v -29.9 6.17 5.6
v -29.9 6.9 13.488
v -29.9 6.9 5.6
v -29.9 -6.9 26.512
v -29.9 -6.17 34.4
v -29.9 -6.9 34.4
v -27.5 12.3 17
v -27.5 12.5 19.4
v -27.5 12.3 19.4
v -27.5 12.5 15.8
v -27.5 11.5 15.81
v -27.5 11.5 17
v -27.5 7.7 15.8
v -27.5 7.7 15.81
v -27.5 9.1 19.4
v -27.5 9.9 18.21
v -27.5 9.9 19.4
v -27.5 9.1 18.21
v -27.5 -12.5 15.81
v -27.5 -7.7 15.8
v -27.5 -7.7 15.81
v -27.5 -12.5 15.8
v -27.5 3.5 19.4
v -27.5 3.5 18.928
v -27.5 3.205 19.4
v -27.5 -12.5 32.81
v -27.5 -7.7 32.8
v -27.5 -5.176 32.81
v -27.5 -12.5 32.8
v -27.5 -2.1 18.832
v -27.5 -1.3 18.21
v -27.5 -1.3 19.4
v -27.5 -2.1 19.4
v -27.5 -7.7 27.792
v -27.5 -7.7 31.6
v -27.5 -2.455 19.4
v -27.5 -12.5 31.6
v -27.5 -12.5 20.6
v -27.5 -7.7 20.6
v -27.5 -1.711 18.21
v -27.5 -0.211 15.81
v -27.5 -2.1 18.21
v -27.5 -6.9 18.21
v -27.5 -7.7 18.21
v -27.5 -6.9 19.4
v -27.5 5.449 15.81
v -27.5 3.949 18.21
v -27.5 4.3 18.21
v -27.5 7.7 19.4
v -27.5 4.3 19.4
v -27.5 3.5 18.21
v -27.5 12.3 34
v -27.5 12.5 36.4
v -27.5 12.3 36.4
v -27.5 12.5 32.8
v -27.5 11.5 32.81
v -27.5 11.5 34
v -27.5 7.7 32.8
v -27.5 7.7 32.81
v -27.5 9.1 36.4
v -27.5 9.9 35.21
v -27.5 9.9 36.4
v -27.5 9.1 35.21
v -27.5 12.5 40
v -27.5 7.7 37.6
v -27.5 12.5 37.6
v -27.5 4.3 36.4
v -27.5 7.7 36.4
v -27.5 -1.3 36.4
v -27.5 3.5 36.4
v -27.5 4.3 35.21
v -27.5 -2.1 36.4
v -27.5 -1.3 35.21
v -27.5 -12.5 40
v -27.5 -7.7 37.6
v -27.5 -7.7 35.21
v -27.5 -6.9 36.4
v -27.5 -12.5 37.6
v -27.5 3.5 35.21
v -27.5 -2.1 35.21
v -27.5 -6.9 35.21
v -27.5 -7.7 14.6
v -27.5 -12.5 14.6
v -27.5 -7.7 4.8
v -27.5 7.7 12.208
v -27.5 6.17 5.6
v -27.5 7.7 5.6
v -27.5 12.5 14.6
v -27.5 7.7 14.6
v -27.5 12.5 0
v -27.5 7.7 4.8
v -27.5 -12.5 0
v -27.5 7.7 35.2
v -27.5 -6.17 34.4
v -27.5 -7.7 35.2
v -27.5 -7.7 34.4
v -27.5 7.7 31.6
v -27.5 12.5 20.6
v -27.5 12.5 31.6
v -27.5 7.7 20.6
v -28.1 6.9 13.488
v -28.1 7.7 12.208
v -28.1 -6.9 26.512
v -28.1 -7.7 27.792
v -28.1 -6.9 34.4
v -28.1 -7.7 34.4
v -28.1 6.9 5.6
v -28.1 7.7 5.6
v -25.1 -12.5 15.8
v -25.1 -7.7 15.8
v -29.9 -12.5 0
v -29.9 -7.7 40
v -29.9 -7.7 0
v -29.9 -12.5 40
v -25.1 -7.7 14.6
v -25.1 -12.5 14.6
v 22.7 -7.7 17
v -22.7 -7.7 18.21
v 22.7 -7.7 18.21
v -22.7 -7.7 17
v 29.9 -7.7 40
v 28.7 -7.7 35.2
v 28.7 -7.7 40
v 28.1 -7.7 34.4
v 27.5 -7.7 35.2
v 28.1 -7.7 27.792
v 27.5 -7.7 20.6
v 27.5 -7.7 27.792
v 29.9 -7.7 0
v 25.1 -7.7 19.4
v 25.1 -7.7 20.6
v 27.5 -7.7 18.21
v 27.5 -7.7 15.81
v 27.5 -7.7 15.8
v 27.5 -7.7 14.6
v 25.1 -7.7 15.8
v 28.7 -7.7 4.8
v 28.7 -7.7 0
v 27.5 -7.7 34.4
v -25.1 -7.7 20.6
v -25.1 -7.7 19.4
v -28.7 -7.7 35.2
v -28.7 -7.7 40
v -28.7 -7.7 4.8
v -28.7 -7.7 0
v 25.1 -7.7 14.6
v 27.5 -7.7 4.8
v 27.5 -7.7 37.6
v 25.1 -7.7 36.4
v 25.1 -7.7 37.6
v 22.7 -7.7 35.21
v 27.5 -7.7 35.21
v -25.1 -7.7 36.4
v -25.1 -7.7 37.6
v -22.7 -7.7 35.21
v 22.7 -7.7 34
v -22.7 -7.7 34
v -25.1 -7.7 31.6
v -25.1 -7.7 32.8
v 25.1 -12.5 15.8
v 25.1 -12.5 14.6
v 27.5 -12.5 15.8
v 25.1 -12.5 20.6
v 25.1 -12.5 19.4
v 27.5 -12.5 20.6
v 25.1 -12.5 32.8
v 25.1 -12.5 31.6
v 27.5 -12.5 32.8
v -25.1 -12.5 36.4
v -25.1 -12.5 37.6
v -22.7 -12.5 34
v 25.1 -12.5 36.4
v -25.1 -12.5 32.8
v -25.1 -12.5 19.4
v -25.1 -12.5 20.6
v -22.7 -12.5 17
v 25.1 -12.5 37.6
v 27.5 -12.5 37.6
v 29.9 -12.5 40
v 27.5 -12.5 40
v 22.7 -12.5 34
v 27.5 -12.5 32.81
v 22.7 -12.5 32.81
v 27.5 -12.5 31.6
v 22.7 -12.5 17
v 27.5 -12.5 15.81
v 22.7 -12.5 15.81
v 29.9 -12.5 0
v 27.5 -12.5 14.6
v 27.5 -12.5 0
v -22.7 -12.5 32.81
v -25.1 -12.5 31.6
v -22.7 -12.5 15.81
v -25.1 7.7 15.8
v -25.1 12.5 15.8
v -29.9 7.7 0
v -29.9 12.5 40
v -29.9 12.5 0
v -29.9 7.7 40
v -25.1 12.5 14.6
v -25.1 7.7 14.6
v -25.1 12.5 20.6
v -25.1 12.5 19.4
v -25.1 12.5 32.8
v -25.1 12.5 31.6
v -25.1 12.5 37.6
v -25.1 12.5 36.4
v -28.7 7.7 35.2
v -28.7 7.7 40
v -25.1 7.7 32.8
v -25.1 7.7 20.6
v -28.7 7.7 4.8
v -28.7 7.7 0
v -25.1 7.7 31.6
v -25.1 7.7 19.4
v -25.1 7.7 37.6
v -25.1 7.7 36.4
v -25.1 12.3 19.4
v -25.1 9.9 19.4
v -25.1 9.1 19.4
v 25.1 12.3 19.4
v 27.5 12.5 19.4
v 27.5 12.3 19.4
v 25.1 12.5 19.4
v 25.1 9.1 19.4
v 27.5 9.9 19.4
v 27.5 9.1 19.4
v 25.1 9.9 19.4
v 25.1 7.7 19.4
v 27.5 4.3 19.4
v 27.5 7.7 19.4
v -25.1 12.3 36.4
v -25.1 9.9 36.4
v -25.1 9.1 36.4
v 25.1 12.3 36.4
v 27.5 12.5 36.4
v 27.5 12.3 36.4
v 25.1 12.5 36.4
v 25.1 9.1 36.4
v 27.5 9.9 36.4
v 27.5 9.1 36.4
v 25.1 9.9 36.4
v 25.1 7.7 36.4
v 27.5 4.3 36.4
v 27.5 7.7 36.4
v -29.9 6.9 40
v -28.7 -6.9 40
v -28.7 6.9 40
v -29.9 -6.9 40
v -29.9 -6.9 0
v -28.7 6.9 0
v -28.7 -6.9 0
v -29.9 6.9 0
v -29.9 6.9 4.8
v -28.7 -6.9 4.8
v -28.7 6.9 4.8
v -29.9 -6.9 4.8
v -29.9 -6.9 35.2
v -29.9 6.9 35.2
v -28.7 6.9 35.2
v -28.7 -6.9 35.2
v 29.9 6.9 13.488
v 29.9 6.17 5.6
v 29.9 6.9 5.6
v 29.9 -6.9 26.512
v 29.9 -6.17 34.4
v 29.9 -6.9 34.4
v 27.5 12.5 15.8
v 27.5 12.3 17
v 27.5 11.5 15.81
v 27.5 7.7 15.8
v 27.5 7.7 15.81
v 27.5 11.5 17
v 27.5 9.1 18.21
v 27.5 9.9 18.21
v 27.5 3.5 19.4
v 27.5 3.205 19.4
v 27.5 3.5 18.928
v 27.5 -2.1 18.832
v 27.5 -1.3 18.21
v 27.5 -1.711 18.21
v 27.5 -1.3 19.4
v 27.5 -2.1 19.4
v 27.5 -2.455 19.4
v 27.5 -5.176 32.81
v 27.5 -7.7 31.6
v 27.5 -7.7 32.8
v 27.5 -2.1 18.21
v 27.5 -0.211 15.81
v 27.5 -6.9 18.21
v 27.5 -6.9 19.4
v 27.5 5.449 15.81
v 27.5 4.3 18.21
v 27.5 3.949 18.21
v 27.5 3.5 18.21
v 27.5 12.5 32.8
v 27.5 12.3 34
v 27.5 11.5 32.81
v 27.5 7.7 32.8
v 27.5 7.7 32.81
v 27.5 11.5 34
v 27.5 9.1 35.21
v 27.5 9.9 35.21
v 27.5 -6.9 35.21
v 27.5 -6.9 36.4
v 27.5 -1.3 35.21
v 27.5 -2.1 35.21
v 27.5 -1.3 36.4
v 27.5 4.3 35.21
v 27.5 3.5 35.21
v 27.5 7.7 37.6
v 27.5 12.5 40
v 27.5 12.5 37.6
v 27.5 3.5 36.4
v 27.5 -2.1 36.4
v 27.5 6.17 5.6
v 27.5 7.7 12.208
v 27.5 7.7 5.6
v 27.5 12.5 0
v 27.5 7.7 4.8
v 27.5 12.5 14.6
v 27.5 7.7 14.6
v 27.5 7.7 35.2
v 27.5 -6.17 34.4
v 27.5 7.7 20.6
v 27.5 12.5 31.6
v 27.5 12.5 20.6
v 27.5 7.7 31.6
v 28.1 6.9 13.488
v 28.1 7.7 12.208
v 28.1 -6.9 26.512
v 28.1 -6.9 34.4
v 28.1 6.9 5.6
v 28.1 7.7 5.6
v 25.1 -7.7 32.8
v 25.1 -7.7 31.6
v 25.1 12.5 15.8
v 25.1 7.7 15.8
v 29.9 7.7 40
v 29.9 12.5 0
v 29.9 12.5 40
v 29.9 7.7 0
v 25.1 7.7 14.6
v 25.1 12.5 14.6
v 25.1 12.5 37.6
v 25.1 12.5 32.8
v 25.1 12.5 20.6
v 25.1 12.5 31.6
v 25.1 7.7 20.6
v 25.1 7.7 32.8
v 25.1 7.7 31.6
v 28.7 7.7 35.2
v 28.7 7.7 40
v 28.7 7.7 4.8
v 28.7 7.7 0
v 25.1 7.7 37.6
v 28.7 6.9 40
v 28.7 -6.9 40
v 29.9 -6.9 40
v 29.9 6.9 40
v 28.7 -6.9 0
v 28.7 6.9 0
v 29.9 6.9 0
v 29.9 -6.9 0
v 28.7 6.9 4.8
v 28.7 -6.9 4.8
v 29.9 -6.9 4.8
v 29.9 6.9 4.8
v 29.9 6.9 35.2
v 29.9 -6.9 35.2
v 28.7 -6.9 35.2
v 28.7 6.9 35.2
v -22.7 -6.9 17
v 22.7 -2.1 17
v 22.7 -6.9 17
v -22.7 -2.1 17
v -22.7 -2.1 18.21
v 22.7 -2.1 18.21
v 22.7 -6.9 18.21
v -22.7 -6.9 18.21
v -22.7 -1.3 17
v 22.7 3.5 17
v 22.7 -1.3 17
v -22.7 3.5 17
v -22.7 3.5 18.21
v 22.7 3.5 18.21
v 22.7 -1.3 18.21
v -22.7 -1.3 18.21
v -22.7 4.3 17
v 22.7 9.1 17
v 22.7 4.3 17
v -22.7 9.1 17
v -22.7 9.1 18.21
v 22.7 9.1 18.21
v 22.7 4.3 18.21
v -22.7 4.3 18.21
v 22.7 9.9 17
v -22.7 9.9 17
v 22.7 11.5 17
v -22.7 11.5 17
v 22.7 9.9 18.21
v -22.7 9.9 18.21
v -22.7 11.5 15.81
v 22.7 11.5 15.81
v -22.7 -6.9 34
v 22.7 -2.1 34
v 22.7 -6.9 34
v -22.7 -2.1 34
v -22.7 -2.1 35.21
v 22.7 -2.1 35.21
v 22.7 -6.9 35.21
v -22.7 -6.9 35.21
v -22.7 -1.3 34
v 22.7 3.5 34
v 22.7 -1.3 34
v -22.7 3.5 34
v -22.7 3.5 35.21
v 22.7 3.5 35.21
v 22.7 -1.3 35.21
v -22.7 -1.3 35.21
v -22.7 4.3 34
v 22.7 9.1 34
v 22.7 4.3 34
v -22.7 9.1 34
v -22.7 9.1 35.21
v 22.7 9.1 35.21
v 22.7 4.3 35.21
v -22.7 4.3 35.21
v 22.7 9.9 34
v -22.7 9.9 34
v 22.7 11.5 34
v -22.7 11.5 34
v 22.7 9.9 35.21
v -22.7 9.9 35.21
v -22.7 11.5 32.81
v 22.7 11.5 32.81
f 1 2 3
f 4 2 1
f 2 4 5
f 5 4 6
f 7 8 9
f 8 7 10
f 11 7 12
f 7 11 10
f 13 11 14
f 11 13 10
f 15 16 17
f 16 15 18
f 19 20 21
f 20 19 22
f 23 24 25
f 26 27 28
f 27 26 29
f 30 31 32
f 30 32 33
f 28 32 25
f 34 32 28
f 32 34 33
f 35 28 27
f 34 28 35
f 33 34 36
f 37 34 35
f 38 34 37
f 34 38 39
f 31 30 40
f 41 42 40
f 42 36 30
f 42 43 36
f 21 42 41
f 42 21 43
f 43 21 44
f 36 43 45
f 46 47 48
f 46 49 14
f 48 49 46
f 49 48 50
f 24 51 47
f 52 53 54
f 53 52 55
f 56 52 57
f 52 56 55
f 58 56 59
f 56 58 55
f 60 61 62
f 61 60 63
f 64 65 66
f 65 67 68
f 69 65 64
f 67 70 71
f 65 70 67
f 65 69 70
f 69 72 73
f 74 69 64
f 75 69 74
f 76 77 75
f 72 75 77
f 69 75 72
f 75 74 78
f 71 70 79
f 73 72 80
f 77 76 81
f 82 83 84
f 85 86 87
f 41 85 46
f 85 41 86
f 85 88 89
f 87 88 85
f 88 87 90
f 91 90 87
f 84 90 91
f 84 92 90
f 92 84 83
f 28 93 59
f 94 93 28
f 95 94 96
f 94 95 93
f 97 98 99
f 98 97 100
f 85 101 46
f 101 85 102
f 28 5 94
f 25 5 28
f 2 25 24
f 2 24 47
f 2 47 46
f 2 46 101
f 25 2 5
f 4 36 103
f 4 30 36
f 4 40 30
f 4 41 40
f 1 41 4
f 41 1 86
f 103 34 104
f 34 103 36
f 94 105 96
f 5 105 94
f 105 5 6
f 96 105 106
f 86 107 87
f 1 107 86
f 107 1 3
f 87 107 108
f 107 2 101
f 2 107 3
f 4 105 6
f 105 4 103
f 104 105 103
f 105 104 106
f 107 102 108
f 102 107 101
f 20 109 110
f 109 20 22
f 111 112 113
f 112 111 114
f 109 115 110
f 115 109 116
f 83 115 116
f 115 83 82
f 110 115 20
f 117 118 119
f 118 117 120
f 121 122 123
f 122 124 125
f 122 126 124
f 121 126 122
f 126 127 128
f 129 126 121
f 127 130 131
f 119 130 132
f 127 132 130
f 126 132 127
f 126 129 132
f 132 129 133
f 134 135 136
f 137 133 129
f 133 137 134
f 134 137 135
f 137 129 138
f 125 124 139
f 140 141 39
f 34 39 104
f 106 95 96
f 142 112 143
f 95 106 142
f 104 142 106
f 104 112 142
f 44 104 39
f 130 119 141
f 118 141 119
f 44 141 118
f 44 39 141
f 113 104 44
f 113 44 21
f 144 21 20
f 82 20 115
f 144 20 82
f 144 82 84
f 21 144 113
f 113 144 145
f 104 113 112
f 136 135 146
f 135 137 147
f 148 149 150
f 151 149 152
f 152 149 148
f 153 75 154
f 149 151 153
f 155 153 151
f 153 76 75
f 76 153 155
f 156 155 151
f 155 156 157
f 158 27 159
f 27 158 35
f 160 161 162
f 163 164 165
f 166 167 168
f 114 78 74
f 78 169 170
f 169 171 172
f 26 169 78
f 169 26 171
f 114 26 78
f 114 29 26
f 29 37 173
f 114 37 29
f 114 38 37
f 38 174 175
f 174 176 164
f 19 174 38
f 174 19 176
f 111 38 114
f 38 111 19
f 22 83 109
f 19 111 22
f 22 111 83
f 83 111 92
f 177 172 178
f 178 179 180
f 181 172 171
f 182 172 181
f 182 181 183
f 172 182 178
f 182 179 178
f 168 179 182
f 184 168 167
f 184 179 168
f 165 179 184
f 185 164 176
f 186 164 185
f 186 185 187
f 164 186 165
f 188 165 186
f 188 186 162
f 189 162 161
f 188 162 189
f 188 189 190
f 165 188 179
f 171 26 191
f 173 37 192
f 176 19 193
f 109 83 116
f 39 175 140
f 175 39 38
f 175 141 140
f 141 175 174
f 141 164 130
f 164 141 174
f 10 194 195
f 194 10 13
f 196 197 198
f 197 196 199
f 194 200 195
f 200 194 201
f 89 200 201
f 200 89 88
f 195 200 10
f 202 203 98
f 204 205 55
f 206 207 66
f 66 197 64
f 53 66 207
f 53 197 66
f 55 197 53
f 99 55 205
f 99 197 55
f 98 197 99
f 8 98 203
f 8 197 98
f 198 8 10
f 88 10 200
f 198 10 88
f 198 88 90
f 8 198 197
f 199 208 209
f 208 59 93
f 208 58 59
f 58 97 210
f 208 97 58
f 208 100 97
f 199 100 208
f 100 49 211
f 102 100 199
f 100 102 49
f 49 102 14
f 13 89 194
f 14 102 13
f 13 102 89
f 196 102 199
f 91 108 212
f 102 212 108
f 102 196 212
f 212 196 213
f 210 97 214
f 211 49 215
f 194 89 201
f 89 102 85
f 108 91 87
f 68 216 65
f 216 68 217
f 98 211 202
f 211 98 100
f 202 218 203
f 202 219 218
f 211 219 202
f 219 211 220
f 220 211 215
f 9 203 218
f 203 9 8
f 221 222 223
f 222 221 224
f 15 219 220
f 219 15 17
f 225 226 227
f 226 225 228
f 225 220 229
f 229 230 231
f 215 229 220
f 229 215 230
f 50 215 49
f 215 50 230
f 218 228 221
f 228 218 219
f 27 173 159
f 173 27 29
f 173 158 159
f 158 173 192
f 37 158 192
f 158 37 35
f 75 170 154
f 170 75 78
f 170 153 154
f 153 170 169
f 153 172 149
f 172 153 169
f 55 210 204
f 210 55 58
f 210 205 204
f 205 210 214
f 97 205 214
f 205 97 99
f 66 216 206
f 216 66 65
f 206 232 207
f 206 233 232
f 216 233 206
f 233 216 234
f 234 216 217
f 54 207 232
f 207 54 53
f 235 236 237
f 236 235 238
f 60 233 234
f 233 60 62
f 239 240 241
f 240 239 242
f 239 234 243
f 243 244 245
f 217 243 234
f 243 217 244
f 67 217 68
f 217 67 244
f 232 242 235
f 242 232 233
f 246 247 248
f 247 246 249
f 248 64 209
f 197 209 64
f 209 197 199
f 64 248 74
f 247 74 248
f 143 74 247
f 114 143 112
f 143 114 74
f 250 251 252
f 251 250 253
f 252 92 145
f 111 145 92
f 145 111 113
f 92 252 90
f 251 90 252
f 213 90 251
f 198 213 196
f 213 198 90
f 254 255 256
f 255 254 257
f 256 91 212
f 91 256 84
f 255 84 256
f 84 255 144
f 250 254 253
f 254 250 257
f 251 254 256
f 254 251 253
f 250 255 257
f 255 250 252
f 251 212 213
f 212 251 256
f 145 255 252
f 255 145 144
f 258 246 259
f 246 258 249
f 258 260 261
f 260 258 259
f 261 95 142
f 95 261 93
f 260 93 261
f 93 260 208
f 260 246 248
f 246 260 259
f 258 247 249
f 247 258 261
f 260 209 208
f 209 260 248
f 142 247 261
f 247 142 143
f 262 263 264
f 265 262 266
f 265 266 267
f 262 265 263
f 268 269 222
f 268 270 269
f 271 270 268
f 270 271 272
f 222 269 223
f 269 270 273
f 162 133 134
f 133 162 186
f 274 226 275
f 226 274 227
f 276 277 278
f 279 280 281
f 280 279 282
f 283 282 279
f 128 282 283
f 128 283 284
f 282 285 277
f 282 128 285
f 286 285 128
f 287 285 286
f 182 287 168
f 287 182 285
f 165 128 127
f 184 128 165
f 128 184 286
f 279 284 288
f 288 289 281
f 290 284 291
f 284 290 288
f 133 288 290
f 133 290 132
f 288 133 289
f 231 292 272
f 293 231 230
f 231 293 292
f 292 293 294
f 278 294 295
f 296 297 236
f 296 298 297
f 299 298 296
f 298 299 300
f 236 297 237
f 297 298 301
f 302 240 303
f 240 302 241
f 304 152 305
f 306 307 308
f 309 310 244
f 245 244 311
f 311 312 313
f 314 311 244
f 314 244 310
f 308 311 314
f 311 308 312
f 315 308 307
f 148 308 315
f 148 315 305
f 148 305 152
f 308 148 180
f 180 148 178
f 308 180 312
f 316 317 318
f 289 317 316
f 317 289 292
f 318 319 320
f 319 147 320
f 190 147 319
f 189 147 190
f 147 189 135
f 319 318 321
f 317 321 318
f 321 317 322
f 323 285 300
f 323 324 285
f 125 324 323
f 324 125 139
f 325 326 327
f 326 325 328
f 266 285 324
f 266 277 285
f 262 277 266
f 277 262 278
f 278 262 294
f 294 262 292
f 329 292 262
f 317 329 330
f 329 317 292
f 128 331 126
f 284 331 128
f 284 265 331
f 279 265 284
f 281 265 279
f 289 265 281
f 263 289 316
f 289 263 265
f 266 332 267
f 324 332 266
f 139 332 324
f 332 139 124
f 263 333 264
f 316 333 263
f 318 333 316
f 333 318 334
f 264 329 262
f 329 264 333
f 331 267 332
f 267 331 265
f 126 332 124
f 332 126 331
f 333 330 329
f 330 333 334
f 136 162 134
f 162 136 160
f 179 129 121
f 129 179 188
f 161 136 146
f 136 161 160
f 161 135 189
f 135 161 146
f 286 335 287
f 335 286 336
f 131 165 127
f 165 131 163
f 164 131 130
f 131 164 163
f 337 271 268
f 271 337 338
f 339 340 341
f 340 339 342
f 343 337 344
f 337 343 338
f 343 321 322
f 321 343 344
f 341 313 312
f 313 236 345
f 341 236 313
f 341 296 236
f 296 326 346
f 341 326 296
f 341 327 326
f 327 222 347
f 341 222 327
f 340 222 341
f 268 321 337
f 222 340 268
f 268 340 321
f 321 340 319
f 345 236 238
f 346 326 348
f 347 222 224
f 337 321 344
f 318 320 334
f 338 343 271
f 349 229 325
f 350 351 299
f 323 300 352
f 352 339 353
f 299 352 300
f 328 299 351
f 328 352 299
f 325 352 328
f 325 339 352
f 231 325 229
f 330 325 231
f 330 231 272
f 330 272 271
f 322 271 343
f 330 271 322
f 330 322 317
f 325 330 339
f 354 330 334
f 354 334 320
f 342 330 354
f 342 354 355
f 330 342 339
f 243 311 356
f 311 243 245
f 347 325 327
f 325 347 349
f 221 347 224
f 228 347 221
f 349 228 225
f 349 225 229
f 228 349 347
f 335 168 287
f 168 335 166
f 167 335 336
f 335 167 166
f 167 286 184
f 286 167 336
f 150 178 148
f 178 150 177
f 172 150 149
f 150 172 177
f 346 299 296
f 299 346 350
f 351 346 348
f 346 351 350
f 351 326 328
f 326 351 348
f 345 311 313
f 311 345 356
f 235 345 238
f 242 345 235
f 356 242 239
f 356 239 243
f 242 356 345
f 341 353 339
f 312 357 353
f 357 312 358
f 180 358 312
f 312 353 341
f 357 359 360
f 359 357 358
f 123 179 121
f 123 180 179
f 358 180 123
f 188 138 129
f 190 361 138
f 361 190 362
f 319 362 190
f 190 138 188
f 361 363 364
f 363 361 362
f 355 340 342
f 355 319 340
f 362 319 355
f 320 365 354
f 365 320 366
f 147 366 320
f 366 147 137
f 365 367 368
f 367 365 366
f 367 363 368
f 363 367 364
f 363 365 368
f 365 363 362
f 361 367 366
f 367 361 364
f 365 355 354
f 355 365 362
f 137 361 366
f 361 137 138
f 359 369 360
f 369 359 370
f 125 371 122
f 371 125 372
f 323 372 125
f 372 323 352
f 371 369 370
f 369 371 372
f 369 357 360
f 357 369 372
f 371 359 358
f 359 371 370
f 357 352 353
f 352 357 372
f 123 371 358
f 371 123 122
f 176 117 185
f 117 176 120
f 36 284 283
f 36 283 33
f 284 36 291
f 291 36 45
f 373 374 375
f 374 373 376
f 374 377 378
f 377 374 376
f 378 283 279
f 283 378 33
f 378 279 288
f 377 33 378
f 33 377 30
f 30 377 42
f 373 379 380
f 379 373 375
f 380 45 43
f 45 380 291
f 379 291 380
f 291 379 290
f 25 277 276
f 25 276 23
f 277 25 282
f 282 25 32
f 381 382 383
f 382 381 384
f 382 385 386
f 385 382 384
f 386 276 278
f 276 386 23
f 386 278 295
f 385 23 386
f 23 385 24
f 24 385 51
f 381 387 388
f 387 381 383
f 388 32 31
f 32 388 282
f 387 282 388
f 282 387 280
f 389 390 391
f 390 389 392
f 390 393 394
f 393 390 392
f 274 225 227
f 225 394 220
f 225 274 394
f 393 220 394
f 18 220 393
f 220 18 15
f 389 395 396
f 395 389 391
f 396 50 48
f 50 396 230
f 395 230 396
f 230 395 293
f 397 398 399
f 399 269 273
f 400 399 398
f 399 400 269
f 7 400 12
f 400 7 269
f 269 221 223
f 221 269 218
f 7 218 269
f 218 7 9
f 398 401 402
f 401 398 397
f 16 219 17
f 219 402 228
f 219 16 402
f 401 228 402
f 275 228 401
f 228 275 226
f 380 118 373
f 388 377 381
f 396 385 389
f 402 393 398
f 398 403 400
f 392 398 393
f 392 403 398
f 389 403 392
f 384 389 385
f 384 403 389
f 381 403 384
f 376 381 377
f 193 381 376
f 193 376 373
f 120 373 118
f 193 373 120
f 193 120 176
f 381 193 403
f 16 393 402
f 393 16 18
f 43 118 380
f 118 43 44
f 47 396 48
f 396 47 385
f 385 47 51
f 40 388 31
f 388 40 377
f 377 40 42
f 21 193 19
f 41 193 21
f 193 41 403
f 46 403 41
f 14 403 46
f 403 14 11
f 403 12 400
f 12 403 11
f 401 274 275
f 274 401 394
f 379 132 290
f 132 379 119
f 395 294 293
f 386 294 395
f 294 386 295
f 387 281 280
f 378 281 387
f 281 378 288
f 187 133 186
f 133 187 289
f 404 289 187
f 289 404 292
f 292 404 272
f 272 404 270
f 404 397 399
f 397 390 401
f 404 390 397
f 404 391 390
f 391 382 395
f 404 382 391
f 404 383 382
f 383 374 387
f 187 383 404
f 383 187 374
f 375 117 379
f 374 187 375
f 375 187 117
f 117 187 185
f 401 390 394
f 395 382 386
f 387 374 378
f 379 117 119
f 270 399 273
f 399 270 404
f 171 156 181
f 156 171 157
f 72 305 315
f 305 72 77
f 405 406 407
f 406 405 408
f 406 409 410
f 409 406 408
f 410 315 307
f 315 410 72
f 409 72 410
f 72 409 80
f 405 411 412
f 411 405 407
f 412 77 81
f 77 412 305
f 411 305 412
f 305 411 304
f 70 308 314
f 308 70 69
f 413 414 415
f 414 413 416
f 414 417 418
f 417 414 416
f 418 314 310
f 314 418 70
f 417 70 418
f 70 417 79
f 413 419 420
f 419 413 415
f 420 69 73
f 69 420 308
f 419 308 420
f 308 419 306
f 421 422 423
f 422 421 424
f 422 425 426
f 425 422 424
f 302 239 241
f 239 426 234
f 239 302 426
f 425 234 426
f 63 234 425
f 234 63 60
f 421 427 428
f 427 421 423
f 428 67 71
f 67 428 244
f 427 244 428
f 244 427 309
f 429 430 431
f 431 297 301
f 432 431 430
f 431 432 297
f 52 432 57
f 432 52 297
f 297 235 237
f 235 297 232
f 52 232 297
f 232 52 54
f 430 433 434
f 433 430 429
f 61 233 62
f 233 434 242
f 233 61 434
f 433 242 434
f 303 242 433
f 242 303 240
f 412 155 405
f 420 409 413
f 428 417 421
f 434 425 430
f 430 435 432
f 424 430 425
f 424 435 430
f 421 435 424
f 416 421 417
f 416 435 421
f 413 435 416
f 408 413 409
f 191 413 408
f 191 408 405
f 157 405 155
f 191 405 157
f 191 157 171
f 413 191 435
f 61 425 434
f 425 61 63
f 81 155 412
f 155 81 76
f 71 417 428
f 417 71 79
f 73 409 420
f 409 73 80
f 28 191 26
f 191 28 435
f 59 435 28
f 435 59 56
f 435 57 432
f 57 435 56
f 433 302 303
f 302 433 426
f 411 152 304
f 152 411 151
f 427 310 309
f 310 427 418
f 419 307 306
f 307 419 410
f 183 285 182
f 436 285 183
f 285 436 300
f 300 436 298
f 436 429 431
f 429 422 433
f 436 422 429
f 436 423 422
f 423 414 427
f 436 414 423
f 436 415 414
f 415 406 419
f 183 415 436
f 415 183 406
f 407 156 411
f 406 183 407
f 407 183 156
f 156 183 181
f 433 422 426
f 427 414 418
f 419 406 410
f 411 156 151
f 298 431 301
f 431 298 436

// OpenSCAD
/* [Parameters] */
parts = 1; // [1:preview, 2:plated, 3: sides_only, 4: shelf_only]

width = 55;
height = 40;
depth = 25;
numShelves = 2;

/* [Hidden] */
boardWidth = 4.8;
boardThick = 1.2;

boardGap = 0.8;

nozzleWidth = 0.4;

clearance = 0;

function getShelfSpacing(h, num) = floor((h - boardWidth)/num);
 

module side(w, h, num)
{
    w2 = w - ((boardGap+boardWidth)*2);
    h2 = h - ((boardGap+boardWidth)*2);
    
    shelfSpacing = getShelfSpacing(h, num);
    
    union() {
        // vertical sides 
        cube([h, boardWidth, boardThick*2]);
        
        translate([0, w-boardWidth, 0])
        cube([h, boardWidth, boardThick*2]);

        // horizaontal sides
        translate([0, boardWidth+boardGap, 0])
        cube([boardWidth, w2, boardThick*2]);
        cube([boardWidth, w, boardThick]);

        translate([h-boardWidth, boardWidth+boardGap, 0])
        cube([boardWidth, w2, boardThick*2]);
        translate([h-boardWidth, 0, 0])
        cube([boardWidth, w, boardThick]);
        
        theta = -atan(w/h);
        
        intersection() {
            translate([h/2, w/2, boardThick])
            rotate([0,0,theta])
            cube([h*2, boardWidth, boardThick*2], center=true);
            
            translate([h/2, w/2, 0])
            cube([h2, w2, boardThick * 5], center=true); 
        }
        
        intersection() {
            translate([h/2, w/2, boardThick])
            rotate([0,0,theta])
            cube([h*2, boardWidth, boardThick*2], center=true);
            
            translate([h/2, w/2, 0])
            cube([h2, w, boardThick], center=true); 
        }
        

        for (i=[1:num]) {
            translate([(i*shelfSpacing)-boardThick*2-clearance,0,-boardThick*2])
            cube([boardThick,boardWidth,boardWidth]);
            
            translate([(i*shelfSpacing)+boardThick*2+clearance,0,-boardThick*2])
            cube([boardThick,boardWidth,boardWidth]);

            translate([(i*shelfSpacing)-boardThick*2-clearance,w-boardWidth,-boardThick*2])
            cube([boardThick,boardWidth,boardWidth]);
            translate([(i*shelfSpacing)+boardThick*2-clearance,w-boardWidth,-boardThick*2])
            cube([boardThick,boardWidth,boardWidth]);
        }
        
    }
}

module single_shelf(w, d) {
    numFullBoards = floor(d/(boardWidth+boardGap));
    
    leftOver = d - (boardWidth*numFullBoards) - (boardGap*(numFullBoards));
    
    finalBoardWidth = floor(leftOver/nozzleWidth) * nozzleWidth;

    totalRealDepth = numFullBoards * (boardWidth + boardGap) + finalBoardWidth - boardGap;
        
    union() {
        for (i=[0:numFullBoards-1]) {
            translate([0, i*(boardWidth+boardGap), 0])
            cube([w, boardWidth, boardThick*2]);
        }
        
        translate([0, numFullBoards*(boardWidth+boardGap), 0])
        cube([w, finalBoardWidth, boardThick*2]);
        
        
        // supports
        translate([0,0,-boardThick+0.01])
        cube([boardWidth, totalRealDepth, boardThick*2]);

        translate([w-boardWidth,0,-boardThick+0.01])
        cube([boardWidth, totalRealDepth, boardThick*2]);
    }
}

module shelves(w, h, d, num)
{
    translate([0,0,0])
    rotate([0,-90,0])
    
    side(d, h, num);
    
    translate([w,0,0])
    rotate([0,-90,0])
    scale([1,1,-1])
    side(d,h, num);
    
    shelfSpacing = getShelfSpacing(h, num);
    
    for (i=[1:num])
    {
        translate([0,0,i*shelfSpacing])
        single_shelf(w,d);
    }
}

module shelf_plated(w, h, d, num)
{
    translate([w*1.2,0,0])
    sides_plated(w,h,d,num);
    
    off = ((num * d) + (num-1)*(d*0.2))/2;
    
    for (i=[0:num-1]) 
    {
        translate([0,i*1.2*d-off+d,0])
        single_shelf_plated(w,h,d);
    }
}

module sides_plated(w, h, d, num)
{
    translate([0,0,boardThick*2])
    rotate([180,0,0])
    side(d,h,num);
    
    translate([0,d*0.2,boardThick*2])
    rotate([180,0,0])
    scale([1,-1,1])
    side(d,h,num);  

}

module single_shelf_plated(w, h, d)
{
    translate([0,0,boardThick*2])
    rotate([180,0,0])
    single_shelf(w,d);
}

// preview
if (parts == 1) {
    translate([-width/2, -depth/2, 0])
    shelves(width, height, depth, numShelves);
}

// plated
if (parts == 2) {
    moveby = (width*1.2 + height)/2;
    translate([-moveby, 0, 0])
    shelf_plated(width, height, depth, numShelves);
}

// just sides
if (parts == 3) {
    sides_plated(width, height, depth, numShelves);
}

// just shelf
if (parts == 4) {
    single_shelf_plated(width, height, depth);
}
